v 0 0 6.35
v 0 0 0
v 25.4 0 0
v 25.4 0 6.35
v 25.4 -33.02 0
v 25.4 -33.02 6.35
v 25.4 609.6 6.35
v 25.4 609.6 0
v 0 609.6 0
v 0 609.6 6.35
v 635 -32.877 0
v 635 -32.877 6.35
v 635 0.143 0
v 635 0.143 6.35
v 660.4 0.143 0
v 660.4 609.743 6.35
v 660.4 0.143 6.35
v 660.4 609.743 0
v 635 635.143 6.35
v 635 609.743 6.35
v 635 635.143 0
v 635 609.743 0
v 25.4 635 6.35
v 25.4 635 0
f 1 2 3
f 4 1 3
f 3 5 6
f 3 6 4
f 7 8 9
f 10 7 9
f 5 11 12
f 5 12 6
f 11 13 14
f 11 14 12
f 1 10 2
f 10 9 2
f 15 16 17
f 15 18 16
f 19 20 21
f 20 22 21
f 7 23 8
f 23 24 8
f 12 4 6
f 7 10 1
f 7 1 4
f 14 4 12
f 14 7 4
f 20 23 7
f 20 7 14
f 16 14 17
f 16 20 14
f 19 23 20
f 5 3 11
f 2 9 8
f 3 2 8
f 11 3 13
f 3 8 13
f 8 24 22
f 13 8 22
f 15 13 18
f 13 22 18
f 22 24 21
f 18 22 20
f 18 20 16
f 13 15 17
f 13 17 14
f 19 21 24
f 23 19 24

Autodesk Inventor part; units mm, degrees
ref_plane "YZ Plane" through (0, 0, 0) normal (1, 0, 0) x (0, 1, 0)
ref_plane "XZ Plane" through (0, 0, 0) normal (0, 1, 0) x (-1, 0, 0)
ref_plane "XY Plane" through (0, 0, 0) normal (0, 0, 1) x (1, 0, 0)
sketch "Sketch1" plane through (0, 0, 0) normal (0, 0, 1) x (1, 0, 0)
  point P0 (0, 0)
sketch "Sketch2" plane through (0, 0, 0) normal (0, 0, 1) x (1, 0, 0)
  line L0 (0, 0) -> (25.4, 0)
  line L1 (25.4, 609.6) -> (0, 609.6)
  line L2 (0, 609.6) -> (0, 0)
  line L3 (635, 0.1426) -> (635, -32.8774)
  line L4 (635, -32.8774) -> (25.4, -33.02)
  line L5 (25.4, -33.02) -> (25.4, 0)
  line L6 (635, 609.7426) -> (635, 635.1426)
  line L7 (635, 635.1426) -> (25.4, 635)
  line L8 (25.4, 635) -> (25.4, 609.6)
  line L9 (635, 609.7426) -> (660.4, 609.7426)
  line L10 (660.4, 609.7426) -> (660.4, 0.1426)
  line L11 (660.4, 0.1426) -> (635, 0.1426)
  dimension "d7" = 609.6
  dimension "d8" = 609.6
  dimension "d9" = 25.4
  dimension "d10" = 25.4
  dimension "d13" = 33.02
extrude "Extrusion1" add sketch "Sketch2" along normal blind 6.35
properties part number "top_panel"
